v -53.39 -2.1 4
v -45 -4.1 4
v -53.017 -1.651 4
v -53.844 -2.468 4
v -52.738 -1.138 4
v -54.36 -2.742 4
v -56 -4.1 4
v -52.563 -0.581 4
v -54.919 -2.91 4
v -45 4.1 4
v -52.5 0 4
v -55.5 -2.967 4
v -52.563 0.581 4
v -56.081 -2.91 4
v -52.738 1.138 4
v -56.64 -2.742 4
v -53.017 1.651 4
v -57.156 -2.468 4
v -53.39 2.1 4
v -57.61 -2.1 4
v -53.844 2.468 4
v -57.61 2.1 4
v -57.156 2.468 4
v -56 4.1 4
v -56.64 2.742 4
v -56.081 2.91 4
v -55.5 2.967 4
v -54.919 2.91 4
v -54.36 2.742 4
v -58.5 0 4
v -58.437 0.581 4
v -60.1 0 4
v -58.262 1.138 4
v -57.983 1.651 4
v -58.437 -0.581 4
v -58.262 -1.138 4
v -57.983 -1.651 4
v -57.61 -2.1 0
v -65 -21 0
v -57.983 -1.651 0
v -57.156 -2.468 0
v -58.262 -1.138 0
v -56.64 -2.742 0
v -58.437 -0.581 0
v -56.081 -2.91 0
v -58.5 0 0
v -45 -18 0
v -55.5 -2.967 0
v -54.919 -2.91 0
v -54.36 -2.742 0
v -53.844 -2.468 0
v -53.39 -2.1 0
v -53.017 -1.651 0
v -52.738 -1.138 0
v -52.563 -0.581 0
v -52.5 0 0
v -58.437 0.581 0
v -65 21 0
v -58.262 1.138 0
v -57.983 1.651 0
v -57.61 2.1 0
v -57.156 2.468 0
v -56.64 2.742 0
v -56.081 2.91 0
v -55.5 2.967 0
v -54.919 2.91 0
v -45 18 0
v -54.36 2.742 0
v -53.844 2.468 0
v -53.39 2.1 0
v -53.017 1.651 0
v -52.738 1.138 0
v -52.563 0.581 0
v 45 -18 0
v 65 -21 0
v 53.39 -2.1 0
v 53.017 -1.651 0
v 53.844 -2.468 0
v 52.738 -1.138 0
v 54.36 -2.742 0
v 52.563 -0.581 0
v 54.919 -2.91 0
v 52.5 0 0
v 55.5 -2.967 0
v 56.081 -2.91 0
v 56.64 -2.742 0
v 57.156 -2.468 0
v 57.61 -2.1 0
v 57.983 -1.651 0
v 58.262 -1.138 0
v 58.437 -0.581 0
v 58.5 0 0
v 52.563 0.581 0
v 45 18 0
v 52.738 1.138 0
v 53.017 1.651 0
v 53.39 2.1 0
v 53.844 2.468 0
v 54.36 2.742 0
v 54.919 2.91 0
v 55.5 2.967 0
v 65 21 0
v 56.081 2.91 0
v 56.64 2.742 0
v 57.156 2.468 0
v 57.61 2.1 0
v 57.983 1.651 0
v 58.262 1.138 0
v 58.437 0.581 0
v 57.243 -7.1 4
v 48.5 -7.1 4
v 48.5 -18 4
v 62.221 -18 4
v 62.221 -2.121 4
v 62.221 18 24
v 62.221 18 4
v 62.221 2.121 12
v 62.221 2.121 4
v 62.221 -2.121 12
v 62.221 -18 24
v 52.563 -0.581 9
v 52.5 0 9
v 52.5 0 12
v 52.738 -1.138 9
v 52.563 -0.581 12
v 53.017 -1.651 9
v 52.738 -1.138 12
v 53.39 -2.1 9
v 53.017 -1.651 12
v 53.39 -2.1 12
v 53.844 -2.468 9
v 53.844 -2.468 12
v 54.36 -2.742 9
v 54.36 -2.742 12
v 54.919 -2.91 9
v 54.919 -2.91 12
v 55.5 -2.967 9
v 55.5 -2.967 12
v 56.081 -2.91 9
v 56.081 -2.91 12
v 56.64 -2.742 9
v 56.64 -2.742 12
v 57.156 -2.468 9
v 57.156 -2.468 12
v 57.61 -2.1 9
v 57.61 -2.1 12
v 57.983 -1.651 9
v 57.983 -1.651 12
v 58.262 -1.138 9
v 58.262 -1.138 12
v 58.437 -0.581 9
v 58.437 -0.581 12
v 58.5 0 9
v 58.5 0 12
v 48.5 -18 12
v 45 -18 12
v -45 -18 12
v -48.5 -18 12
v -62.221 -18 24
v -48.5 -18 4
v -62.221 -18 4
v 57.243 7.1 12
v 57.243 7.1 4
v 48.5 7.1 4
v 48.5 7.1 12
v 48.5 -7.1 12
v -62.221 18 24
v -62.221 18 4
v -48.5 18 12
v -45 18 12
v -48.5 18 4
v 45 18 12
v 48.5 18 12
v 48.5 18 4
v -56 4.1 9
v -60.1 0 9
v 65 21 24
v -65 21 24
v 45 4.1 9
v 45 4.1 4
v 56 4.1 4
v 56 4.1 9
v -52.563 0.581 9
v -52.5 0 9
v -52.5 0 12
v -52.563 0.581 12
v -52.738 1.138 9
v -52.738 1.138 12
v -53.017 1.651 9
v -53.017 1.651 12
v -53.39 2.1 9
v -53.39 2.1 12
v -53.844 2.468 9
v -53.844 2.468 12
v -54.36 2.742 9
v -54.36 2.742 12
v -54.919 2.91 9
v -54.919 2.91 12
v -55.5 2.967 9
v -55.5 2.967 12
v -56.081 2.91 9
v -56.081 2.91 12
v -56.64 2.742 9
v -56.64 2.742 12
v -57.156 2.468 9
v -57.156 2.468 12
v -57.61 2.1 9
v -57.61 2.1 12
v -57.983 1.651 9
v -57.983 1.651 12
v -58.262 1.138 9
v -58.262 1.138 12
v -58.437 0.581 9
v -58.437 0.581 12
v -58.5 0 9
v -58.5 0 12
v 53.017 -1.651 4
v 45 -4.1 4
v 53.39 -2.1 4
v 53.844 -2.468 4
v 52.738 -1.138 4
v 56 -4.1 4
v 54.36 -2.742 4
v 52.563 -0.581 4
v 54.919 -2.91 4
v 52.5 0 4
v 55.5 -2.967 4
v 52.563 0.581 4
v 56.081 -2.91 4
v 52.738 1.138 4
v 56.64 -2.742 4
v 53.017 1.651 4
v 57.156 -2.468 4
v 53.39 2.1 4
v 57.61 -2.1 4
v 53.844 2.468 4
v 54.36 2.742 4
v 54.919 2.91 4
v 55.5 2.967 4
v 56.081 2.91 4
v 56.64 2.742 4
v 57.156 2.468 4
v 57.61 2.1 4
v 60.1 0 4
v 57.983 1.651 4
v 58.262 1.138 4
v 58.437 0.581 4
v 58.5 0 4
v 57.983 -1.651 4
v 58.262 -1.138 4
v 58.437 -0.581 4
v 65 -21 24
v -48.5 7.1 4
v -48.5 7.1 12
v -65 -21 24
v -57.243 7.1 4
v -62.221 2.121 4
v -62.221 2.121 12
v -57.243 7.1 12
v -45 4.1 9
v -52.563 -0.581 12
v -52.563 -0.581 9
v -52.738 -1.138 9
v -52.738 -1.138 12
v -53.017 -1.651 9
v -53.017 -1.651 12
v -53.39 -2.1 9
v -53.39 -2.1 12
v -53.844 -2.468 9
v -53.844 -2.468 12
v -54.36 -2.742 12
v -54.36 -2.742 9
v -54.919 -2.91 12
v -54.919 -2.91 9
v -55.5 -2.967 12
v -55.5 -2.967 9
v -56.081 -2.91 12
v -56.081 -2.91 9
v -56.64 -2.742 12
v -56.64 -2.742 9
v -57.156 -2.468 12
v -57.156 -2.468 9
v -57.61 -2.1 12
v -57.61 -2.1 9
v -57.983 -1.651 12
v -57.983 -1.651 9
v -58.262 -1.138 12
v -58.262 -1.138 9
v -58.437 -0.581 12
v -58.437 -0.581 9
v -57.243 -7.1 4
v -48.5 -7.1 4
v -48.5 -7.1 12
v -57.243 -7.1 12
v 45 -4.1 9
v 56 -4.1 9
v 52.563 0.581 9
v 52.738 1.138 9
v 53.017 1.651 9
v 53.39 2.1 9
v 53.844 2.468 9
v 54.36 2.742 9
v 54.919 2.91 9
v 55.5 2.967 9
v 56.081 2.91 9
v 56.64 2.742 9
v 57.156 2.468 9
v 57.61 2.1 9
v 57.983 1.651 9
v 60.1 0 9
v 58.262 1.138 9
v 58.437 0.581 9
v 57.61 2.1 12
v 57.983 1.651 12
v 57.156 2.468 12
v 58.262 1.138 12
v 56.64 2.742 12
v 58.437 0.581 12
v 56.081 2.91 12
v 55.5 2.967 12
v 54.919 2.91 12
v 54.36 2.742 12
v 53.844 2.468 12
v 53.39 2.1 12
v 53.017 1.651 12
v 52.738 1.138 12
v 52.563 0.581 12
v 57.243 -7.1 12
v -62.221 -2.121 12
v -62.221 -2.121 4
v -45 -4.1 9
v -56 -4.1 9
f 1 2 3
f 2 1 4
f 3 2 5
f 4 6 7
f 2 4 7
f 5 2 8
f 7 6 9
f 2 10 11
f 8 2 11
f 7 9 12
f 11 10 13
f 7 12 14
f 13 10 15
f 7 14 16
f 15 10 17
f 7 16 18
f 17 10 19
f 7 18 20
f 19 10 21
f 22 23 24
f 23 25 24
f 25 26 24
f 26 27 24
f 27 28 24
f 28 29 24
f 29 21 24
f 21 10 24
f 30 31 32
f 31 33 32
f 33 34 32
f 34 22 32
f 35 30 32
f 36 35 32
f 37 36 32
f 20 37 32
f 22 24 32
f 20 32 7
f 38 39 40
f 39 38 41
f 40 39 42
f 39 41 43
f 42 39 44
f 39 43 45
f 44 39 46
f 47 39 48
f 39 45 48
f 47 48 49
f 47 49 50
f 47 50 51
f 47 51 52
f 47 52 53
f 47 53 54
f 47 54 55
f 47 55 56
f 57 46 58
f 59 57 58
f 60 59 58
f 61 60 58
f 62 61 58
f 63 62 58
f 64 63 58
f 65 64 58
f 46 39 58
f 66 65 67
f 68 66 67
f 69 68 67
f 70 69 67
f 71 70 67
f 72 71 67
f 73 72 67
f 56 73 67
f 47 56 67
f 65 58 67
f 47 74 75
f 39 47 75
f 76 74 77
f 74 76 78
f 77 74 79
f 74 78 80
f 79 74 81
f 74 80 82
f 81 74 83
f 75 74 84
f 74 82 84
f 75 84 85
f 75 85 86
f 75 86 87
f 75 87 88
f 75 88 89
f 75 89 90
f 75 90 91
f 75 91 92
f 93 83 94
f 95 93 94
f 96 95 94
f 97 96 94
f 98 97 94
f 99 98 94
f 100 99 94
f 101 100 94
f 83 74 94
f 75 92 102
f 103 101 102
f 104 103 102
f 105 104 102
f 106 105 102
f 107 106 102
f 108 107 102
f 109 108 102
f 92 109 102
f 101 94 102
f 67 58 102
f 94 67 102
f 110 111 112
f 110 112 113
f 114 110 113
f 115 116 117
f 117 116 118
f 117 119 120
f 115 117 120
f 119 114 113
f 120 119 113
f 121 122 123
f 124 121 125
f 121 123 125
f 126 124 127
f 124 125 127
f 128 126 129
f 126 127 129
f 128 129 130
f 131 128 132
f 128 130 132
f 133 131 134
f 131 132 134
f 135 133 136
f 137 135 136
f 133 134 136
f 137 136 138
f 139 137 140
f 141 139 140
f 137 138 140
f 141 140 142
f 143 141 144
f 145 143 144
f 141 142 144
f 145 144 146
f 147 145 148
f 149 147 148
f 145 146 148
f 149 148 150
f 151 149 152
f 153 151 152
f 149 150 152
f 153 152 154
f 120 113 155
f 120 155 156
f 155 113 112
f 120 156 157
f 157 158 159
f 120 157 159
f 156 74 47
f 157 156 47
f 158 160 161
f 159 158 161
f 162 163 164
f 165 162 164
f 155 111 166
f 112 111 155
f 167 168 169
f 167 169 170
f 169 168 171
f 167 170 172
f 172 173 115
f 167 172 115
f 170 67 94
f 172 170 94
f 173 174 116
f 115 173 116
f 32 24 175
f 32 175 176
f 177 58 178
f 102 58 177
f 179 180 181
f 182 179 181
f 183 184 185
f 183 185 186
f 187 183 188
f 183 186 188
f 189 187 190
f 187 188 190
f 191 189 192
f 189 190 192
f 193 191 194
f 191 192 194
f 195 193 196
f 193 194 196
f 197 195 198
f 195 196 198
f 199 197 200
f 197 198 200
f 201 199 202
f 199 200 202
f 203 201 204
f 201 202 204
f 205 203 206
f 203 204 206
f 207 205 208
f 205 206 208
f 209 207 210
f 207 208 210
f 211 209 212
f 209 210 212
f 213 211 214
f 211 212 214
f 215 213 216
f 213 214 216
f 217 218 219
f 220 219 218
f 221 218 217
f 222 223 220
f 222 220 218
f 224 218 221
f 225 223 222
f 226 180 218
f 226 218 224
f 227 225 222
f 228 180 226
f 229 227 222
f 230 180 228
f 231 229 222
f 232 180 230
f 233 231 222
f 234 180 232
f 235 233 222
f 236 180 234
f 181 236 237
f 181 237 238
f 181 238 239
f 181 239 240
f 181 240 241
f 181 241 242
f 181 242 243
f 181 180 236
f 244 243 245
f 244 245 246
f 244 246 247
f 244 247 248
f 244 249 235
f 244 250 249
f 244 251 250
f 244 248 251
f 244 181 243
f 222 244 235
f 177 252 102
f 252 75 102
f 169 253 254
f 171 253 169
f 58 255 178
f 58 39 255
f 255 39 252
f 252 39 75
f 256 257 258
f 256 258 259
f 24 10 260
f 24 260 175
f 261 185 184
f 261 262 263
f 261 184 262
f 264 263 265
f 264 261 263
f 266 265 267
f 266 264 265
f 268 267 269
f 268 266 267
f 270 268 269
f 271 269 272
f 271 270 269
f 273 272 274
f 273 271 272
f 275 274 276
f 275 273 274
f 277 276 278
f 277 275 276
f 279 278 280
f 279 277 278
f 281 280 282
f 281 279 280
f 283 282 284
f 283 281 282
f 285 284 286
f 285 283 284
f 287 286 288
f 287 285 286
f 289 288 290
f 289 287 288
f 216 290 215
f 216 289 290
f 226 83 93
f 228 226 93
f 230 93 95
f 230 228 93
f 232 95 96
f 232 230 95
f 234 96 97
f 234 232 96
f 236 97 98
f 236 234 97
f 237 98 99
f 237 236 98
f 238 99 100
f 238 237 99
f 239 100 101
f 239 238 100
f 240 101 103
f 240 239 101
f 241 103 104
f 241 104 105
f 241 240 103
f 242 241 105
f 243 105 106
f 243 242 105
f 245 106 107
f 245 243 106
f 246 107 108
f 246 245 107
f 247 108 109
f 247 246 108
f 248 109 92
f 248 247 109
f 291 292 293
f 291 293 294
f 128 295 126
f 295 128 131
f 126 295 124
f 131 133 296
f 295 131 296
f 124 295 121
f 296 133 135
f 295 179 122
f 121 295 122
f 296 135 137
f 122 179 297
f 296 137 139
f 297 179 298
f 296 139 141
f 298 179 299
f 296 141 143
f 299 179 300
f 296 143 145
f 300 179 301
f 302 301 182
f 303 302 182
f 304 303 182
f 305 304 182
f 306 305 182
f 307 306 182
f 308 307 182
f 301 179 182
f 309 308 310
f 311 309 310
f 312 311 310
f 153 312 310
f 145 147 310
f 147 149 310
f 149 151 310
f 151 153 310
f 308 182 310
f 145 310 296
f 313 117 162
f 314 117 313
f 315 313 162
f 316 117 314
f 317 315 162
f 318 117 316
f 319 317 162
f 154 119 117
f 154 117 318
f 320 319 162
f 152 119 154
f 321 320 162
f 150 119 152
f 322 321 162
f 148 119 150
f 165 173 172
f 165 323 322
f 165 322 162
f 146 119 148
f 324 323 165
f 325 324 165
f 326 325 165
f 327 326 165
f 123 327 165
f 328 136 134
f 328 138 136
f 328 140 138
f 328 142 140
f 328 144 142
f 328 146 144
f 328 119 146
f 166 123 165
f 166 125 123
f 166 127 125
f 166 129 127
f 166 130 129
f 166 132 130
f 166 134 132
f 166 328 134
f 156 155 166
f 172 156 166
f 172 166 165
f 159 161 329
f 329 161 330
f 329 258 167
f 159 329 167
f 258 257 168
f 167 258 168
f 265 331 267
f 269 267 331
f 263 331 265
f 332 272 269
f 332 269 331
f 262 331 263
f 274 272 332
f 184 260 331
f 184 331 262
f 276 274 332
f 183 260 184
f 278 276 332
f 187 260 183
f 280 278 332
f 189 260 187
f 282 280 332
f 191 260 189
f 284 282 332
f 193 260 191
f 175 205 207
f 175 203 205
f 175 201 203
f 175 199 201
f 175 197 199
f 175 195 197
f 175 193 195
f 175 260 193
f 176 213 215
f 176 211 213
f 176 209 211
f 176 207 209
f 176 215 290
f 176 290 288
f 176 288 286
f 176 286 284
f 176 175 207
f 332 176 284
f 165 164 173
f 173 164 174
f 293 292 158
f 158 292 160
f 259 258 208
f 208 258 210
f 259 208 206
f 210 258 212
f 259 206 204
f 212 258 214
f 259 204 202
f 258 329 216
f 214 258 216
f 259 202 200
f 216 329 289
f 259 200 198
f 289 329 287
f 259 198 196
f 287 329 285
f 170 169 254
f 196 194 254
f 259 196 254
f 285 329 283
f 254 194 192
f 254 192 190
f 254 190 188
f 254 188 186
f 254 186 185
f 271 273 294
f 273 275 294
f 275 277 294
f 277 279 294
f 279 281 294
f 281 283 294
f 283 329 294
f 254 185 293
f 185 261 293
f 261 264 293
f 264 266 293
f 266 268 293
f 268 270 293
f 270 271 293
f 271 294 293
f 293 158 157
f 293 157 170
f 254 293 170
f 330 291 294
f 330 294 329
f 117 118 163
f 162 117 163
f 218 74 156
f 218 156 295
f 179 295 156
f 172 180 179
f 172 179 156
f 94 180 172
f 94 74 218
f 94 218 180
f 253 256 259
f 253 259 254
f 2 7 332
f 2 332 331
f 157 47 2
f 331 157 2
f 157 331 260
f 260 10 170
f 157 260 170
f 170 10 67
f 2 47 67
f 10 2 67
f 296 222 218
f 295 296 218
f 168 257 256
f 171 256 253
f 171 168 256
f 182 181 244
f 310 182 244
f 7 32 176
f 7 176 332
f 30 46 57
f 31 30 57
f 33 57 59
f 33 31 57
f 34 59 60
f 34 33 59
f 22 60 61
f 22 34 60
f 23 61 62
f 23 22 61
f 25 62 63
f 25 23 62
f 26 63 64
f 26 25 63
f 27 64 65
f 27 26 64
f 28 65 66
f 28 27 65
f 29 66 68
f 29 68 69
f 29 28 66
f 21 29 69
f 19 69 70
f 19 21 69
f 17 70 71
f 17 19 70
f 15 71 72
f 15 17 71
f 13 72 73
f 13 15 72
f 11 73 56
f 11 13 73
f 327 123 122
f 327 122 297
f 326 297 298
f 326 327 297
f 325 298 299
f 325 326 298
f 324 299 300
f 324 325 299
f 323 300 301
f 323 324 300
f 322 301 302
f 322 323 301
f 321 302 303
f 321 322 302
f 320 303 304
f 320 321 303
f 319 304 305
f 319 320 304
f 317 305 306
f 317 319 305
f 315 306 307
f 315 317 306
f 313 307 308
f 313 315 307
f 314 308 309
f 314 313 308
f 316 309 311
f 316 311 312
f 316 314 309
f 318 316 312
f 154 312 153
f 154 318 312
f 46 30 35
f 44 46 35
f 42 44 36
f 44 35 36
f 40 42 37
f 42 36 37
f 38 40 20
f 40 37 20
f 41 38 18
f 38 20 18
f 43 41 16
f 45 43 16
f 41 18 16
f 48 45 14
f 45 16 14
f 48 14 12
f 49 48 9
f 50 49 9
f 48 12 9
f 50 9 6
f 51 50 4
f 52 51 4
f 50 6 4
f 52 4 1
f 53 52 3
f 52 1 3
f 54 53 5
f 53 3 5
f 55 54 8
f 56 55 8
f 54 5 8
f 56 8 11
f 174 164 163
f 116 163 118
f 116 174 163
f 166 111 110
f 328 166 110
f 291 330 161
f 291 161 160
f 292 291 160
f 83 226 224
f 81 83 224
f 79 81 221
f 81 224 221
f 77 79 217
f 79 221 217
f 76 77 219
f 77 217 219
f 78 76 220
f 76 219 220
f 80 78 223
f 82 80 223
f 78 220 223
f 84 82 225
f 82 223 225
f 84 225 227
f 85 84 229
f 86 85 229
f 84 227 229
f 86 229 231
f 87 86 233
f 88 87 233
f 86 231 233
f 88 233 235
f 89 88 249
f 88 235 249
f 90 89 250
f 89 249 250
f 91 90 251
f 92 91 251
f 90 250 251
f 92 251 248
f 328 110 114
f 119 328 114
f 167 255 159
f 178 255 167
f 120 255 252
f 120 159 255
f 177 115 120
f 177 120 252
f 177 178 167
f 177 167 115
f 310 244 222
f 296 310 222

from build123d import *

# Parameters (mm, degrees)
F0_W      = 130
F0_H      = 42
F0_W_2    = 90
F0_H_2    = 36
F1_DEPTH  = 4
F3_DEPTH  = 5
F5_DEPTH  = 3
F6_SIZE   = 3
F7_R      = 3
F8_DEPTH  = 12.5
F10_R     = 3
F11_DEPTH = 37.9
F12_W     = 130
F12_H     = 42
F13_DEPTH = 20
F14_W     = 3.5
F14_H     = 10.9
F15_DEPTH = 8


with BuildPart() as f1:
    # F0 (on Top) → F1 (new body)
    with BuildSketch(Plane.XY):
        Rectangle(F0_W, F0_H)
        Rectangle(F0_W_2, F0_H_2, mode=Mode.SUBTRACT)
    extrude(amount=F1_DEPTH)

    # F2 (on face) → F3 (join)
    with BuildSketch(Plane.XY.offset(4)):
        Polygon((45, 7.1), (45, 4.1), (56, 4.1), (60.1, 0), (56, -4.1), (45, -4.1), (45, -7.1), (57.242641, -7.1), (64.342641, 0), (57.242641, 7.1), align=None)
    extrude(amount=F3_DEPTH)

    # F4 (on face) → F5 (join)
    with BuildSketch(Plane.XY.offset(9)):
        Polygon((57.242641, 7.1), (45, 7.1), (45, -7.1), (57.242641, -7.1), (64.342641, 0), align=None)
        Polygon((57.242641, 7.1), (45, 7.1), (45, -4.1), (45, -7.1), (57.242641, -7.1), (64.342641, 0), align=None)
    extrude(amount=F5_DEPTH)

    # F6
    f6_edges = [f1.edges().sort_by_distance(p)[0] for p in [
        (64.342641, 0, 8),
    ]]
    chamfer(f6_edges, length=F6_SIZE)

    # F7 (on face) → F8 (cut, symmetric)
    with BuildSketch(Plane.XY.offset(4)):
        with Locations((55.5, 0.032705)):
            Circle(F7_R)
    extrude(amount=F8_DEPTH, both=True, mode=Mode.SUBTRACT)

    # F9: F1 across plane


with BuildPart() as f1_1:
    add(f1.part)
    add(f1.part.mirror(Plane.YZ))

    # F10 (on face) → F11 (cut)
    with BuildSketch(Plane.XY.offset(12)):
        with Locations((-55.5, 0.032705)):
            Circle(F10_R)
        with Locations((55.5, 0.032705)):
            Circle(F10_R)
    extrude(amount=-F11_DEPTH, mode=Mode.SUBTRACT)

    # F12 (on face) → F13 (join)
    with BuildSketch(Plane.XY.offset(4)):
        Rectangle(F12_W, F12_H)
        Polygon((45, 18), (62.22132, 18), (62.22132, 2.12132), (62.22132, -2.12132), (62.22132, -18), (45, -18), (-45, -18), (-62.22132, -18), (-62.22132, -2.12132), (-62.22132, 2.12132), (-62.22132, 18), (-45, 18), align=None, mode=Mode.SUBTRACT)
    extrude(amount=F13_DEPTH)

    # F14 (on face) → F15 (join)
    with BuildSketch(Plane.XY.offset(4)):
        with Locations((-46.75, 12.55)):
            Rectangle(F14_W, F14_H)
    extrude(amount=F15_DEPTH)

    # F16: F1 across plane


with BuildPart() as f1_2:
    add(f1_1.part)
    add(f1_1.part.mirror(Plane.XZ))

    # F17: F1 across plane


with BuildPart() as f1_3:
    add(f1_2.part)
    add(f1_2.part.mirror(Plane.YZ))


solid = f1_3.part
